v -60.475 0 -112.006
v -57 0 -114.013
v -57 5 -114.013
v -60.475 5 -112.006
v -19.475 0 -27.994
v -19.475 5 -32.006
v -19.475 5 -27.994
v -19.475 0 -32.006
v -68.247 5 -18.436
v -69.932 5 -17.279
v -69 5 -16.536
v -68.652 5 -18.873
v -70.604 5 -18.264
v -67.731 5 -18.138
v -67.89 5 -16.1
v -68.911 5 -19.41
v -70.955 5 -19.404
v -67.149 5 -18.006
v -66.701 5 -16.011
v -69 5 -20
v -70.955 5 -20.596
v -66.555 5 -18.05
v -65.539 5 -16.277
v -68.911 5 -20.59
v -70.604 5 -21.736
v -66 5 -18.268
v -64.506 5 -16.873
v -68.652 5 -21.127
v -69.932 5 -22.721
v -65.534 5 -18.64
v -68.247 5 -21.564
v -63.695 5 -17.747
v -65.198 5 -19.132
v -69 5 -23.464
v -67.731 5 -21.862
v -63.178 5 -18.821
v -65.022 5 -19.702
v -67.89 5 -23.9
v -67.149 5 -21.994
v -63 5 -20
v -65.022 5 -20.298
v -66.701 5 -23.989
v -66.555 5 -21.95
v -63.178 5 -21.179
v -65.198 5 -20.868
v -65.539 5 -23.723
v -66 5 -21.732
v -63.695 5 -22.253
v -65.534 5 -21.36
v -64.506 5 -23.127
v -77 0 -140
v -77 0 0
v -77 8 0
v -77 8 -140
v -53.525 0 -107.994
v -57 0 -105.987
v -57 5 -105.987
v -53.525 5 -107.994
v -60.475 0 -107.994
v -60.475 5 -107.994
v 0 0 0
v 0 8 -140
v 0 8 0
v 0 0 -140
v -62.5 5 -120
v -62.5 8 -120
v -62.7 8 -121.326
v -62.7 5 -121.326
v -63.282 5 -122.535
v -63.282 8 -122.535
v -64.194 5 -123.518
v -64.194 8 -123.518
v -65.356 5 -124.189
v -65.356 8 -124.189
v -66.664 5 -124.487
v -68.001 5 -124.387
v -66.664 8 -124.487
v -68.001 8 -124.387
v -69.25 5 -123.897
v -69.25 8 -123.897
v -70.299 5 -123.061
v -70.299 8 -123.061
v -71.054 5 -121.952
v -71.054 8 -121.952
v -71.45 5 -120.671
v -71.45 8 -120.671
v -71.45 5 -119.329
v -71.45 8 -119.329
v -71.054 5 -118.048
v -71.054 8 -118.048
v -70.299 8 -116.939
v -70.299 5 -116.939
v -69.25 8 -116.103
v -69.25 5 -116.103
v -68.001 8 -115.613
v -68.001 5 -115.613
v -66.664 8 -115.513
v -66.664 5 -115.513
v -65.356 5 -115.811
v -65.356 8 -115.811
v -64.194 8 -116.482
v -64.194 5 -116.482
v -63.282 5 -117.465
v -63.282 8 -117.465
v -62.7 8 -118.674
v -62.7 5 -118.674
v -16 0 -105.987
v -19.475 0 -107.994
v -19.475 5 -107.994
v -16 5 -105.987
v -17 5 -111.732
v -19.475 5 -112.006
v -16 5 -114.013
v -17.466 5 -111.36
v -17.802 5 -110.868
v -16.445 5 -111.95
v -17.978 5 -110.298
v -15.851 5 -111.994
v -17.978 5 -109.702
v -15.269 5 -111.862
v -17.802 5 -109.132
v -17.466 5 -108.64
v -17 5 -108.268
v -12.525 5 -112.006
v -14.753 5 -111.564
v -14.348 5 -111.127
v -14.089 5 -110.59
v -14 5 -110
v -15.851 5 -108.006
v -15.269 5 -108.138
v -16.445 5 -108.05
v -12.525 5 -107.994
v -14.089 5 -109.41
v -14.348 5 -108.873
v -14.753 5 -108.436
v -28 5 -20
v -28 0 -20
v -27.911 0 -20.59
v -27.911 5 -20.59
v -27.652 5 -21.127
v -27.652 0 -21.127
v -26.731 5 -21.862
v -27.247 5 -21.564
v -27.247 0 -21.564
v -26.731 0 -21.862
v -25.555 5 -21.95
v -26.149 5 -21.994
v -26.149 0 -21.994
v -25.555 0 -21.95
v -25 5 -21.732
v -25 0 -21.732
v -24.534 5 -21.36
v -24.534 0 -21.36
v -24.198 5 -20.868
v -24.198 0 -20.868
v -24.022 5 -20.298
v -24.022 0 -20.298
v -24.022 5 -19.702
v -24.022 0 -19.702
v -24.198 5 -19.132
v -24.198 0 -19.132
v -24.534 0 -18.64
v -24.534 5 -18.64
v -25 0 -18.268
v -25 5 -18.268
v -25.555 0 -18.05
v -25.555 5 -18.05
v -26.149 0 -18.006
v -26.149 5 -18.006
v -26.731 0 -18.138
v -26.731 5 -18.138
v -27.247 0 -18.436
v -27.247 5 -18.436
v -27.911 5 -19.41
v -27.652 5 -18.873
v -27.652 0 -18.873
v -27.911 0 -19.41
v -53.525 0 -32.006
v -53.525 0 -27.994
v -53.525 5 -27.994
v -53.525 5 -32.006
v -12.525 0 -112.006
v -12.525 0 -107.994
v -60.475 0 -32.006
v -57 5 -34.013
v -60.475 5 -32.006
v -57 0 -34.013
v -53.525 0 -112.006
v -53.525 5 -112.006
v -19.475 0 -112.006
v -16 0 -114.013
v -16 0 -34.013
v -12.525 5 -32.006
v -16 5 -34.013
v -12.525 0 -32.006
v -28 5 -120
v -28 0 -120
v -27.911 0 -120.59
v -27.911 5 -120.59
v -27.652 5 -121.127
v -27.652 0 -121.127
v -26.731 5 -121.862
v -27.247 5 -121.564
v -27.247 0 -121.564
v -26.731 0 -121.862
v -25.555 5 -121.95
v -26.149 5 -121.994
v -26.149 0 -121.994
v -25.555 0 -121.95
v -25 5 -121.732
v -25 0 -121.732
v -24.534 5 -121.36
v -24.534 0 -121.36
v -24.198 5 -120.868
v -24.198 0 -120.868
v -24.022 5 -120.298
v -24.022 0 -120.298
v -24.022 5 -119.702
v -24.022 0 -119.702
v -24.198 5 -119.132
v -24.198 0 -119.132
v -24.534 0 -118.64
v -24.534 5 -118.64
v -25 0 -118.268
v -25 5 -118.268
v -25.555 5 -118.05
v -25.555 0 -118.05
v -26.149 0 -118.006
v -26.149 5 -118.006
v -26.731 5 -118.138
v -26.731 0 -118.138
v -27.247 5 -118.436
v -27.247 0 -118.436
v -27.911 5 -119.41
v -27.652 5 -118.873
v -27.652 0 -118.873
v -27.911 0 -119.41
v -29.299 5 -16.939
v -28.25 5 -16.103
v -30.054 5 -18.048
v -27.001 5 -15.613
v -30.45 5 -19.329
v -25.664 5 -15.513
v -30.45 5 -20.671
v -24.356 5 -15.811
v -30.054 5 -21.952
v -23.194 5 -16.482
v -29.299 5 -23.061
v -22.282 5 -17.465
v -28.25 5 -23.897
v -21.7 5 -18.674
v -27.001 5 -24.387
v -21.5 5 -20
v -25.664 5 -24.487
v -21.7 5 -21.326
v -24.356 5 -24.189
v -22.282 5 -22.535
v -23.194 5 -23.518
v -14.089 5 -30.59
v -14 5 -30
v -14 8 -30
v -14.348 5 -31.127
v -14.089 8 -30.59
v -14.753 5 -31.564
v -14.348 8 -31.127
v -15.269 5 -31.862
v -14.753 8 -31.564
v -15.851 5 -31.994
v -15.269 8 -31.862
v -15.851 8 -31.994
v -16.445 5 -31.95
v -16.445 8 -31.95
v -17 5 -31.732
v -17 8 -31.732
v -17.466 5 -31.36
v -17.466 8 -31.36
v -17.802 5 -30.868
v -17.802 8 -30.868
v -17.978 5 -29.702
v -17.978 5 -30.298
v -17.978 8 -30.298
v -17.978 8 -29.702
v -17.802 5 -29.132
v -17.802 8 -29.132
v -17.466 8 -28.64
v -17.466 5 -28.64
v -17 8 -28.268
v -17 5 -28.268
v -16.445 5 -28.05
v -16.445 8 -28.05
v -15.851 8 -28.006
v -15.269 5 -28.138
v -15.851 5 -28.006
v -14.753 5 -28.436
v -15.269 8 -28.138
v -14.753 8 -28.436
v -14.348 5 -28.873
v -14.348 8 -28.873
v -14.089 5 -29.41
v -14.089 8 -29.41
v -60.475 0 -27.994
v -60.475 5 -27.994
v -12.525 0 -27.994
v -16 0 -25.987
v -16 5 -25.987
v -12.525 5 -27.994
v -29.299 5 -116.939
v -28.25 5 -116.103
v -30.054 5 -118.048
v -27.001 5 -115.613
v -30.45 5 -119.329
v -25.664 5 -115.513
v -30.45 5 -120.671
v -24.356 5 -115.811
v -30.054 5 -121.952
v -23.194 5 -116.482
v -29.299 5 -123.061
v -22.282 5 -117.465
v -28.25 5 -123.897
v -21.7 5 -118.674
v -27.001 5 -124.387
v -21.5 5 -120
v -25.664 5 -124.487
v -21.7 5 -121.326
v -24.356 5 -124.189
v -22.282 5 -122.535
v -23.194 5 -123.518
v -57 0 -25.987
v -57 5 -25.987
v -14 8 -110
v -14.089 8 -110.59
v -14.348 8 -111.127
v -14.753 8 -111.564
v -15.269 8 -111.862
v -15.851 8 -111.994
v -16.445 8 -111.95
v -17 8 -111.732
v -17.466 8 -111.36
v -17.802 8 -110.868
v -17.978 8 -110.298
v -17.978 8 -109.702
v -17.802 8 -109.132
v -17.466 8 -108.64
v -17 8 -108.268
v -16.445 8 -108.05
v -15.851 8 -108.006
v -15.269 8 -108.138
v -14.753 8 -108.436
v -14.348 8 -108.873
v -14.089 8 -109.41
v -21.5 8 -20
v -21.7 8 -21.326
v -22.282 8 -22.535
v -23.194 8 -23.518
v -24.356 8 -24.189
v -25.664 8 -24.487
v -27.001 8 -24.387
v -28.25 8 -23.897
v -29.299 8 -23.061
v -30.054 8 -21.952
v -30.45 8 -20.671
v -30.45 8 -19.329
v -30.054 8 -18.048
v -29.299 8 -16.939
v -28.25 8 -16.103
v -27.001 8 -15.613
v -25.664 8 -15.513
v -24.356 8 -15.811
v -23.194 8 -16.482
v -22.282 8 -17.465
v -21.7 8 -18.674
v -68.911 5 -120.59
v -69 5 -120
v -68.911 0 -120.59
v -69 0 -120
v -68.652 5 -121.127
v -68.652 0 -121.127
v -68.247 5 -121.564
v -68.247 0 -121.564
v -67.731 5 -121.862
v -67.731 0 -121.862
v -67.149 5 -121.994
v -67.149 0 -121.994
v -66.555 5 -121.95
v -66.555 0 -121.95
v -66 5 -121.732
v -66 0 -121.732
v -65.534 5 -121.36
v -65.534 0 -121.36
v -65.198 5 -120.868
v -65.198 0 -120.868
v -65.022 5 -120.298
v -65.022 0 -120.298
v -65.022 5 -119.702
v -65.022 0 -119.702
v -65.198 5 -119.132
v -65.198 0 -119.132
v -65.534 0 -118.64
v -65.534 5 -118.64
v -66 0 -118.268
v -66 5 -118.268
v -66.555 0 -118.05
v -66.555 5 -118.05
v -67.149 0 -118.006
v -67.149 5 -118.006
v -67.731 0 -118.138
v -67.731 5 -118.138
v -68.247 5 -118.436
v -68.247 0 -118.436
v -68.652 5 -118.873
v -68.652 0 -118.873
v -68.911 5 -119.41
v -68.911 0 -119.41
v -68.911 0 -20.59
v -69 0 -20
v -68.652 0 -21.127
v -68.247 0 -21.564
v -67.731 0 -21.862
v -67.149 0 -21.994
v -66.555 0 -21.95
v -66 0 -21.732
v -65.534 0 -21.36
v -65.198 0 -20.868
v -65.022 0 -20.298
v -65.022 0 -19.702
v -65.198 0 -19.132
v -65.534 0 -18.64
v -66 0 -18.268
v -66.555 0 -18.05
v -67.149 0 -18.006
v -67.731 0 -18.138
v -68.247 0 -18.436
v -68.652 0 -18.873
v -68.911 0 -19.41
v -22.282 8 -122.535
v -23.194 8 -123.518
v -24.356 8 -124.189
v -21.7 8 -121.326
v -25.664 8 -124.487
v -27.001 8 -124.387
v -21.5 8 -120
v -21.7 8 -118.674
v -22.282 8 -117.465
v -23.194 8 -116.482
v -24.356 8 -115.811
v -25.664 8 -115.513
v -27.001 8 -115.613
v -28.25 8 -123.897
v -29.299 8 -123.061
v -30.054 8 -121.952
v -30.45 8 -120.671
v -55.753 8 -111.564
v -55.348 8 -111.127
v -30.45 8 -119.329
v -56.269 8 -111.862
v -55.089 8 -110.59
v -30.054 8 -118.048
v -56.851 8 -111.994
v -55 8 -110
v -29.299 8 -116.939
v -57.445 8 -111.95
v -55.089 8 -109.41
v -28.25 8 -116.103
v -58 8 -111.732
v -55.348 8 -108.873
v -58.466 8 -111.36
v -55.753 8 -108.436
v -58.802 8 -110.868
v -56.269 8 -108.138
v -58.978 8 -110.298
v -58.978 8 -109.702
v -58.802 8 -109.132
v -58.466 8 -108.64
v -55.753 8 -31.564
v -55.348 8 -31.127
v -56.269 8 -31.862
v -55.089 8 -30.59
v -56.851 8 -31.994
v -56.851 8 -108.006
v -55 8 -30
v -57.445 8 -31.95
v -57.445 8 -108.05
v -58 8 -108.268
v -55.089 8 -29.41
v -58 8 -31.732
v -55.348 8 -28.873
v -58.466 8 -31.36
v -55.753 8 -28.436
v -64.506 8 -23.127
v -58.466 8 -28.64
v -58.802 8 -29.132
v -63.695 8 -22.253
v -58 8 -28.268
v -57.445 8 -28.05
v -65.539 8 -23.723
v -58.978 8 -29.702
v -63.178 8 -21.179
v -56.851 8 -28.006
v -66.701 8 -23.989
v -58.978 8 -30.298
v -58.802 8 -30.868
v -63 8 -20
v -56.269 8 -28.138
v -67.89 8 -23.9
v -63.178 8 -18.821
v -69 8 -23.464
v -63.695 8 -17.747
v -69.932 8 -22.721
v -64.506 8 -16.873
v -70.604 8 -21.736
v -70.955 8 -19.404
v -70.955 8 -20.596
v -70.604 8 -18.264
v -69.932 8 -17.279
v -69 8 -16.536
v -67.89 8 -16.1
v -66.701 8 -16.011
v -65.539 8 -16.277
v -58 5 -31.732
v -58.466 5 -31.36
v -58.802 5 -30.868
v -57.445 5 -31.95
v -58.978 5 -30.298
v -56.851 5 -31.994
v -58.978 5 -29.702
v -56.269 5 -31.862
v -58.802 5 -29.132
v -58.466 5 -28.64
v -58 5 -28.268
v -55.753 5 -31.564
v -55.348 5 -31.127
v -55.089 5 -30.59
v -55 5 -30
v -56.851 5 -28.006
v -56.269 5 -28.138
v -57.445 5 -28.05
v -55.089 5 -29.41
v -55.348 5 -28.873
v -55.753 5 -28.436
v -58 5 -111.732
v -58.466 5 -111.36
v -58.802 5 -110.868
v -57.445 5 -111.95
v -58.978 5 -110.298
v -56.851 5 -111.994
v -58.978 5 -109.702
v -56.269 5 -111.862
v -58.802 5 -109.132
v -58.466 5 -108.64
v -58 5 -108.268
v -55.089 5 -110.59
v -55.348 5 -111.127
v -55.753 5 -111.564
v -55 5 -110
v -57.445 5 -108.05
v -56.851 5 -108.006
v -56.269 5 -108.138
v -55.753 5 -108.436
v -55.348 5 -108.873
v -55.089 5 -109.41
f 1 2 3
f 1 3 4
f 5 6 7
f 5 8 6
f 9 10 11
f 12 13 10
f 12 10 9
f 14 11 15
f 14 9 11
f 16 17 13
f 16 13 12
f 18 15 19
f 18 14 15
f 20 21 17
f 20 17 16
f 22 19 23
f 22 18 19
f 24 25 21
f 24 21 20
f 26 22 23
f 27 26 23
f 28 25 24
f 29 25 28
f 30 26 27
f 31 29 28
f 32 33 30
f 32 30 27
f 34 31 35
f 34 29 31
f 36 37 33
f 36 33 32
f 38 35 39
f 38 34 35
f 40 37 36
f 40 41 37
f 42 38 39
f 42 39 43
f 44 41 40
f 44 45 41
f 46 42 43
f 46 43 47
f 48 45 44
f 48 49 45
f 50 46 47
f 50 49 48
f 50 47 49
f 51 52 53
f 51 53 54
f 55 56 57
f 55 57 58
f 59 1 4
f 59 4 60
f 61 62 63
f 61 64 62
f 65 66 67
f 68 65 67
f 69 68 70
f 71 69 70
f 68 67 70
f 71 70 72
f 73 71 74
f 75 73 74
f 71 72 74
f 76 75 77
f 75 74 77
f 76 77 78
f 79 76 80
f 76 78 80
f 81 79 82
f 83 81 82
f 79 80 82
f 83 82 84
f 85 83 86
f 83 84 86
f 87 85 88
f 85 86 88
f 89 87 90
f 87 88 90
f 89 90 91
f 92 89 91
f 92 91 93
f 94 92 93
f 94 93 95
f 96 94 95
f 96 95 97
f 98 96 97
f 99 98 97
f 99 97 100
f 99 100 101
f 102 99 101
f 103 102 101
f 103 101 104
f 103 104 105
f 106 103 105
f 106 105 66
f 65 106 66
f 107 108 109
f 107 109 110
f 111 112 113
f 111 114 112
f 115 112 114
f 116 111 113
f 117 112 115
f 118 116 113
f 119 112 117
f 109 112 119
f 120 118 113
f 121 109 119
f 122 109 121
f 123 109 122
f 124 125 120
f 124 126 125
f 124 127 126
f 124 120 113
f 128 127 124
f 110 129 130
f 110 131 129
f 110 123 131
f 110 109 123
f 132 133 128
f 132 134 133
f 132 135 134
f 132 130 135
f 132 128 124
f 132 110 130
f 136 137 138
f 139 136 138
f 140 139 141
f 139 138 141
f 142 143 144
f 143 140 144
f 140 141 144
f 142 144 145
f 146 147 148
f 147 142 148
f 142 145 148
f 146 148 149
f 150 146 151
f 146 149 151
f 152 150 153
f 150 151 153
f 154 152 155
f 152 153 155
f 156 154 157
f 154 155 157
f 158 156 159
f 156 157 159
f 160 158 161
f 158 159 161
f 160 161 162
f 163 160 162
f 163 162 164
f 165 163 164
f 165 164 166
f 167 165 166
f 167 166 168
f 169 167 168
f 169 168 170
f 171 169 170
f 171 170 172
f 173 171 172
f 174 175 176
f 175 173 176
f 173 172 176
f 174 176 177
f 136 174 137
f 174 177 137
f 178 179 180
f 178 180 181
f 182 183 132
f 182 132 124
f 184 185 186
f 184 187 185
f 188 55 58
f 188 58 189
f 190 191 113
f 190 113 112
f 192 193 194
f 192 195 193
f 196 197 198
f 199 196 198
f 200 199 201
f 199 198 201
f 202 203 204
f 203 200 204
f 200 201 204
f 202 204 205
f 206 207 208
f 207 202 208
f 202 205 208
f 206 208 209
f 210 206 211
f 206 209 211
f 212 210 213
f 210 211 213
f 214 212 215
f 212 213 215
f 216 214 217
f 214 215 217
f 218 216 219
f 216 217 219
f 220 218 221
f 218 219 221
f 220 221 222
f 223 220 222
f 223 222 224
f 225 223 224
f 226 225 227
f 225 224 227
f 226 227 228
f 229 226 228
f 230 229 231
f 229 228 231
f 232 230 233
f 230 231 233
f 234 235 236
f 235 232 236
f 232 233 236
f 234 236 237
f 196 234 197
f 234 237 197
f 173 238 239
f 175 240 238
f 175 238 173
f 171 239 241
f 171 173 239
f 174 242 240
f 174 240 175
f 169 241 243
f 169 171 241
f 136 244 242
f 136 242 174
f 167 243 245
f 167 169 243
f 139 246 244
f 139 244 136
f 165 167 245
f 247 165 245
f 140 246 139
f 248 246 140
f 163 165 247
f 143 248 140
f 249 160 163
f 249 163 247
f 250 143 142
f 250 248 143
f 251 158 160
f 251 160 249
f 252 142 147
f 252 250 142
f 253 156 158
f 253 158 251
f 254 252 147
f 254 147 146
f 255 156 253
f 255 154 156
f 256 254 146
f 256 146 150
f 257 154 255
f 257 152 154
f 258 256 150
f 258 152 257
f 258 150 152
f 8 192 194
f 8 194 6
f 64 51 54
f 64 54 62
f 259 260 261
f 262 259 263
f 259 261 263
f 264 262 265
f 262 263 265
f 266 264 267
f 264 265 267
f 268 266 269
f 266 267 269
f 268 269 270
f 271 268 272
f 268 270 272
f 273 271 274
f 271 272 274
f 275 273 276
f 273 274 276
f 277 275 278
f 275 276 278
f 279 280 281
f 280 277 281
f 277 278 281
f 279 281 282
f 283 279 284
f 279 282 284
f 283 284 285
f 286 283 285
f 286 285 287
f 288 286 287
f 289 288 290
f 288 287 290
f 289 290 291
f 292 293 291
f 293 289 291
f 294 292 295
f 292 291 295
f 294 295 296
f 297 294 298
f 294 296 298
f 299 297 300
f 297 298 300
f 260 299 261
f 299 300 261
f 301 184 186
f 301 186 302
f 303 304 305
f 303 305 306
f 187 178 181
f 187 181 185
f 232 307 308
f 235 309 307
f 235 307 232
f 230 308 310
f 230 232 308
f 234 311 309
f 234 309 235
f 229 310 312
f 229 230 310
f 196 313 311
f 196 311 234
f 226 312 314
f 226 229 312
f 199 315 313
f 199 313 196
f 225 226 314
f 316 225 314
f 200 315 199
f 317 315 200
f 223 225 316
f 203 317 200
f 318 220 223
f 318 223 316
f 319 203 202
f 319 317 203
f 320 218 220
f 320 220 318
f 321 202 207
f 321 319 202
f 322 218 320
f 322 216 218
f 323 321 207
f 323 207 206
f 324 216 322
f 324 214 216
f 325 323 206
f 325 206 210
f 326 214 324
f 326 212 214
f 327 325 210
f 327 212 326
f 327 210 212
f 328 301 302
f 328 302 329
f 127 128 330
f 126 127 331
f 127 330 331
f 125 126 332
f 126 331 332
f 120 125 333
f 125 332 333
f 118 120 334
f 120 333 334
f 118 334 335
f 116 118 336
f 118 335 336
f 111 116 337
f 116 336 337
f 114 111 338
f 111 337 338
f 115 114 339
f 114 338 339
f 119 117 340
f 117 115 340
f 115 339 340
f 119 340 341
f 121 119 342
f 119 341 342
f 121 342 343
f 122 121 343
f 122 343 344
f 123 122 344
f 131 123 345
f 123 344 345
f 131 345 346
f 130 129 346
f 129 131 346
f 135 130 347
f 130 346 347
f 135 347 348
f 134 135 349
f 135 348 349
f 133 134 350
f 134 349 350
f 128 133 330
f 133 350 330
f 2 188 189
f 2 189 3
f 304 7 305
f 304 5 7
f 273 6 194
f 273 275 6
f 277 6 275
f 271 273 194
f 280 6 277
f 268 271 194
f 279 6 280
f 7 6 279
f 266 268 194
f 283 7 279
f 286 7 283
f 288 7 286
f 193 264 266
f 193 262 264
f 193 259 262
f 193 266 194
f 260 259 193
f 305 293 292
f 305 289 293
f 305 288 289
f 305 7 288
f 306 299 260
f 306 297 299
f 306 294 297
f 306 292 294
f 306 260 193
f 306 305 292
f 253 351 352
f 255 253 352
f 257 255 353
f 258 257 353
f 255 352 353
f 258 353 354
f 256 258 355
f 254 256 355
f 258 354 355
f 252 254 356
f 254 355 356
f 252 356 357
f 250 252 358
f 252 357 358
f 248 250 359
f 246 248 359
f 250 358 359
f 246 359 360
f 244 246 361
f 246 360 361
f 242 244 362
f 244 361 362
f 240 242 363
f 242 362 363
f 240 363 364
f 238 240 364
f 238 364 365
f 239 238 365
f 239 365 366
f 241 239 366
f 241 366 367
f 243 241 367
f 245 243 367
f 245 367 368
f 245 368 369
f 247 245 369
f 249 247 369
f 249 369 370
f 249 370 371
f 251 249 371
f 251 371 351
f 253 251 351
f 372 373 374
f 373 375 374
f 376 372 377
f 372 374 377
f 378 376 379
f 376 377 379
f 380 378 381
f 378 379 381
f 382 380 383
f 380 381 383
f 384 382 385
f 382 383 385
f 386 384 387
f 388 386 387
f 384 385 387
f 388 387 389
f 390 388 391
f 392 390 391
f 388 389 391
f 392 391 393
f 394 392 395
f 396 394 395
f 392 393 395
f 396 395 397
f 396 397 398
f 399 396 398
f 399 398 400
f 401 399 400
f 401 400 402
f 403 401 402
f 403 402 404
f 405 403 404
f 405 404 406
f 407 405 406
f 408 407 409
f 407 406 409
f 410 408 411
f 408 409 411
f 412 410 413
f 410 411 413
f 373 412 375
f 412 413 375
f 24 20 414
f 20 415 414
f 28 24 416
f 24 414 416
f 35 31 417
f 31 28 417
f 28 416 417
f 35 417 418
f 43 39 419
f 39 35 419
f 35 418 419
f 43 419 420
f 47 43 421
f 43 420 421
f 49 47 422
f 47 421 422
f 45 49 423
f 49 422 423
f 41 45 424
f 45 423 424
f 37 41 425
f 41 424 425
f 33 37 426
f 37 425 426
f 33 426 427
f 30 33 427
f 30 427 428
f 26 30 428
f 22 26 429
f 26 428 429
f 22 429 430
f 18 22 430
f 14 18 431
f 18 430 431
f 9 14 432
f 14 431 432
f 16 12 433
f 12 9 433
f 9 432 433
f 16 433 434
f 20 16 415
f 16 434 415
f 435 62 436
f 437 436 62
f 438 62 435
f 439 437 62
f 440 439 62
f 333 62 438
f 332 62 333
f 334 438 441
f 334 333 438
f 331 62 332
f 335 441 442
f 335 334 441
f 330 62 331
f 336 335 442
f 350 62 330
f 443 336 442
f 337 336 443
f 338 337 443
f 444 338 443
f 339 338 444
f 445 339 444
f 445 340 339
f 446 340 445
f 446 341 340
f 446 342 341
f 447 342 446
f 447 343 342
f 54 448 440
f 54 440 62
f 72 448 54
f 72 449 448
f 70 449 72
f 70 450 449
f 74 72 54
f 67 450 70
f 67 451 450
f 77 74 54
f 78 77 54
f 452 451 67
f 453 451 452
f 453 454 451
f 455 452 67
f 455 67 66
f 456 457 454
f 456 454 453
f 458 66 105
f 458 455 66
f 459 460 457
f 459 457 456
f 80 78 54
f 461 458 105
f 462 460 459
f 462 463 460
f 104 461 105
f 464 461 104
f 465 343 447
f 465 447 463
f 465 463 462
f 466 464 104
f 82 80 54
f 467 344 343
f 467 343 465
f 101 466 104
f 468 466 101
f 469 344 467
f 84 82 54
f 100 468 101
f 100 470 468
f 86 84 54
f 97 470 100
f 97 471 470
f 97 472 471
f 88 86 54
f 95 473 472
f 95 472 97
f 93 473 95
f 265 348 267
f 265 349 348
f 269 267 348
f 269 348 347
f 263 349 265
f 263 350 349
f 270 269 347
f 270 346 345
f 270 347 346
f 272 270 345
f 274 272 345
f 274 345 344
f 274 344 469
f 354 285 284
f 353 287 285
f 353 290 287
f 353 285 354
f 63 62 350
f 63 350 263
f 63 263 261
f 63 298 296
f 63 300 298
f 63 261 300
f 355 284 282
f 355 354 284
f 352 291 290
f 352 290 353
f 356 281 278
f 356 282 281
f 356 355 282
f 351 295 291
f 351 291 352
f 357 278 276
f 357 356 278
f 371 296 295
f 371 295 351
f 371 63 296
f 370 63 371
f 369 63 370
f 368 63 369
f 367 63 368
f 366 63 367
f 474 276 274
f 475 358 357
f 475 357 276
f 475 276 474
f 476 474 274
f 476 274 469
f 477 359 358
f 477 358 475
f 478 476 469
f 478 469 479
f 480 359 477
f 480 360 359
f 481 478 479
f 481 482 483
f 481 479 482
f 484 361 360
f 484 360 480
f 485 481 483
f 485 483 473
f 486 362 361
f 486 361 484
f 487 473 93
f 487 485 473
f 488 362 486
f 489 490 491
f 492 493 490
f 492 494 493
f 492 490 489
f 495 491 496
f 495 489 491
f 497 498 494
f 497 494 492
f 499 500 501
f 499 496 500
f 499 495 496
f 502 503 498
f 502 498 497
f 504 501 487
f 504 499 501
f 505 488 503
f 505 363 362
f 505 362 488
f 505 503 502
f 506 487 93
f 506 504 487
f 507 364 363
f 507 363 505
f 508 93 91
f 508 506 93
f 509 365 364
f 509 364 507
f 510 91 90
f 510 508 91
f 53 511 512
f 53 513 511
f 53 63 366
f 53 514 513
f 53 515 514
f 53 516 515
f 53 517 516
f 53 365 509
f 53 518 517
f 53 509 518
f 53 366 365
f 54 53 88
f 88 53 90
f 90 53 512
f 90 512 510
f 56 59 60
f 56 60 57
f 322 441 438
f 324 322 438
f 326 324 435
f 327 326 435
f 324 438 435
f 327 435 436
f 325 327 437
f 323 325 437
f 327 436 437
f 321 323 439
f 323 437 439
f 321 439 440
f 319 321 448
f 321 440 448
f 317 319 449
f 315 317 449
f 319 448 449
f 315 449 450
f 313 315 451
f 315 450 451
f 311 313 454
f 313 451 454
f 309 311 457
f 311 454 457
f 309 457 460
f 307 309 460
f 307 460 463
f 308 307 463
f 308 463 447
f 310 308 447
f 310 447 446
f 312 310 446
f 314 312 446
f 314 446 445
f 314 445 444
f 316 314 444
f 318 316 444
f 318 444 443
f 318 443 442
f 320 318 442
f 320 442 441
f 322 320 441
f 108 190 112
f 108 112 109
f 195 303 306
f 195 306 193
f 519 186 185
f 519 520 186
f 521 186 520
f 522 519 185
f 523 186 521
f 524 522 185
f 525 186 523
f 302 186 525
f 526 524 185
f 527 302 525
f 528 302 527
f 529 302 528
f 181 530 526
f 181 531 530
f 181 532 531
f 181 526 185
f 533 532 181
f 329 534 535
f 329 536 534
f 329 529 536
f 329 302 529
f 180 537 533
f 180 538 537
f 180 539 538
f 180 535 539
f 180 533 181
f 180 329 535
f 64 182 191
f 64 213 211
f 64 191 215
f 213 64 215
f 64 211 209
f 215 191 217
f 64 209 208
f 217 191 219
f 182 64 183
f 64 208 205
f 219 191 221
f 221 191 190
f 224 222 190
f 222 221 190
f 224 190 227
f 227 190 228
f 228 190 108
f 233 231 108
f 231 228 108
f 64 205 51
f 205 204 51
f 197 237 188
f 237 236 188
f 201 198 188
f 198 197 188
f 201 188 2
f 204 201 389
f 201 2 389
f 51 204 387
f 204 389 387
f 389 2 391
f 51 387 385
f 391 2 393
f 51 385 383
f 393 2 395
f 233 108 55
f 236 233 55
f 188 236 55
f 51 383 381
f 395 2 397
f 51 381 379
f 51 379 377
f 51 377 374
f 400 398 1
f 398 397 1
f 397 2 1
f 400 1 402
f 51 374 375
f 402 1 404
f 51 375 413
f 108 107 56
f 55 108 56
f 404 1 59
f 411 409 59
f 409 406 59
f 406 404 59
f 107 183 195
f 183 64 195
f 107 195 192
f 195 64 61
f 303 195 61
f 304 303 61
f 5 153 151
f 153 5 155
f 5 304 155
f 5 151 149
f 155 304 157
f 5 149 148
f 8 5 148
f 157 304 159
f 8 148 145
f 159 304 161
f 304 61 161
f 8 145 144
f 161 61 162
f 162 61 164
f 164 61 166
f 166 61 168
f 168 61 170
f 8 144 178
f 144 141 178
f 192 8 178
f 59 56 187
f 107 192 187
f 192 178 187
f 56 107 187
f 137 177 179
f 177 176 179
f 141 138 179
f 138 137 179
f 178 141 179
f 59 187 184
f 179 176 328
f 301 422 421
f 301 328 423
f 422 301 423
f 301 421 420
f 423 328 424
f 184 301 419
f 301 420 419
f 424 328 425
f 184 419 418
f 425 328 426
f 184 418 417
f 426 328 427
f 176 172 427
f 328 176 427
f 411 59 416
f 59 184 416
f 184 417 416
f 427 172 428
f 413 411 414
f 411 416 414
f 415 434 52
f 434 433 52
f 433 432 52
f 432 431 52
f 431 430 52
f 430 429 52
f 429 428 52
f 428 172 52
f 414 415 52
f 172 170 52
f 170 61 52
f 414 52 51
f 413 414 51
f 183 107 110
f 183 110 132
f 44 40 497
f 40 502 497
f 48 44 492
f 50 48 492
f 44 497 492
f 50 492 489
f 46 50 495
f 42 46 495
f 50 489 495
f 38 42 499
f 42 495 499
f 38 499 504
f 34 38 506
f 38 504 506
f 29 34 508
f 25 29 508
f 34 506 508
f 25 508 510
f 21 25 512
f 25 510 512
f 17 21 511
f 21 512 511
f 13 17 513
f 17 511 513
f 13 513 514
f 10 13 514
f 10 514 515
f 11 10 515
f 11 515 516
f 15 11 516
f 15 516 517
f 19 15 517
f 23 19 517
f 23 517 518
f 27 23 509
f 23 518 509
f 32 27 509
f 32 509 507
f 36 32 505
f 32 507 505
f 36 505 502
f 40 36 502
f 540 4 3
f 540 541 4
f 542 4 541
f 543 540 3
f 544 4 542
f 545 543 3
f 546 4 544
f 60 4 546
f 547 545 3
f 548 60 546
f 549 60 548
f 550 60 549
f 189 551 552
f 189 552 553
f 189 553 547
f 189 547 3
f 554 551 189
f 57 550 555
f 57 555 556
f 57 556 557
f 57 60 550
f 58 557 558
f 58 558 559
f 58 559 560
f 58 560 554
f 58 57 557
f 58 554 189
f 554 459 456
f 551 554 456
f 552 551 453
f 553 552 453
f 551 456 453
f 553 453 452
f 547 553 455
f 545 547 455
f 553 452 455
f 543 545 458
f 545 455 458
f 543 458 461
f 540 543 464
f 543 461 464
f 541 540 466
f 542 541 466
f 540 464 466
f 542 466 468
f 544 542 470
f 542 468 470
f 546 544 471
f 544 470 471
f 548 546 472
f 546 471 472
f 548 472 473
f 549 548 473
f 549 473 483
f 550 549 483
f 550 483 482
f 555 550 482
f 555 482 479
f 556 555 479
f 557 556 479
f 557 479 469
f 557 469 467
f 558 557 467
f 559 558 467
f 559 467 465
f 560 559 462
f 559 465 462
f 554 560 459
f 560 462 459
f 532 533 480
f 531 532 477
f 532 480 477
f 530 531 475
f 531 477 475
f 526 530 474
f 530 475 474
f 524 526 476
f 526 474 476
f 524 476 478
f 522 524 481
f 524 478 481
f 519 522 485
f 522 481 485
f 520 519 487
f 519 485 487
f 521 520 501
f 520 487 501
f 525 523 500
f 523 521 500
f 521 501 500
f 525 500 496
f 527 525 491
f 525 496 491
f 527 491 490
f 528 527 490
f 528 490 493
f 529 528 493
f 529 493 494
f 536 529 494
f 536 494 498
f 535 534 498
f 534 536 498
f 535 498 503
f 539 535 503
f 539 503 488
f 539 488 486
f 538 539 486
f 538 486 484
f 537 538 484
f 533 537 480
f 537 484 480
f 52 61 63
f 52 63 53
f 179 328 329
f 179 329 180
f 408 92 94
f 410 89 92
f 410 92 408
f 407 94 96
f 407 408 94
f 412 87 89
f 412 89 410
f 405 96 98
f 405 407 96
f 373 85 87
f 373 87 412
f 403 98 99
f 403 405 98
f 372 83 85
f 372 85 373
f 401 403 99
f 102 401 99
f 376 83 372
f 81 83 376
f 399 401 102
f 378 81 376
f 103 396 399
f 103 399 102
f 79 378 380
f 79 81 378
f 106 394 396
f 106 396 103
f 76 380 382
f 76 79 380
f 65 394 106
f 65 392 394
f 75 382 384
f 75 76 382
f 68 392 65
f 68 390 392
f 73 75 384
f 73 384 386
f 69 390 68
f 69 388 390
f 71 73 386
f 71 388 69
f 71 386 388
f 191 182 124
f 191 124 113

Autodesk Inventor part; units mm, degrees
ref_plane "YZ Plane" through (0, 0, 0) normal (1, 0, 0) x (0, 1, 0)
ref_plane "XZ Plane" through (0, 0, 0) normal (0, 1, 0) x (-1, 0, 0)
ref_plane "XY Plane" through (0, 0, 0) normal (0, 0, 1) x (1, 0, 0)
sketch "Esboço1" plane through (0, 0, 0) normal (0, 1, 0) x (-1, 0, 0)
  line L0 (0, 0) -> (77, 0)
  line L1 (77, 0) -> (77, -140)
  line L2 (77, -140) -> (0, -140)
  line L3 (0, -140) -> (0, 0)
  circle A0 centre (67, -20) radius 2
  circle A1 centre (67, -120) radius 2
  circle A2 centre (26, -20) radius 2
  circle A3 centre (26, -120) radius 2
  dimension "d0" = 77
  dimension "d1" = 140
  dimension "d2" = 4
  dimension "d3" = 4
  dimension "d4" = 4
  dimension "d5" = 4
  dimension "d6" = 10
  dimension "d7" = 10
  dimension "d8" = 20
  dimension "d9" = 20
  dimension "d10" = 20
  dimension "d11" = 20
  dimension "d12" = 26
  dimension "d13" = 26
extrude "Extrusão1" add sketch "Esboço1" along normal blind 8
sketch "Esboço2" plane through (0, 8, 0) normal (0, 1, 0) x (1, 0, 0)
  circle A0 centre (-67, 20) radius 2 projected
  circle A1 centre (-26, 20) radius 2 projected
  circle A2 centre (-26, 120) radius 2 projected
  circle A3 centre (-67, 120) radius 2 projected
  circle A4 centre (-67, 20) radius 4
  circle A5 centre (-67, 120) radius 2 projected
  circle A6 centre (-67, 120) radius 4.5
  circle A7 centre (-26, 120) radius 2 projected
  circle A8 centre (-26, 120) radius 4.5
  circle A9 centre (-26, 20) radius 2 projected
  circle A10 centre (-26, 20) radius 4.5
  point P0 (0, 0)
  dimension "d16" = 8
  dimension "d17" = 9
  dimension "d18" = 9
  dimension "d19" = 9
extrude "Extrusão2" cut sketch "Esboço2" against normal blind 3 contours A3 | A4 | A6 | A8 | A10
sketch "Esboço3" plane through (0, 8, 0) normal (0, 1, 0) x (1, 0, 0)
  point P0 (0, 0)
sketch "Esboço4" plane through (0, 8, 0) normal (0, 1, 0) x (1, 0, 0)
  circle A0 centre (-57, 30) radius 2
  circle A1 centre (-57, 110) radius 2
  circle A2 centre (-67, 20) radius 2 projected
  circle A3 centre (-67, 120) radius 2 projected
  circle A4 centre (-16, 30) radius 2
  circle A5 centre (-16, 110) radius 2
  circle A6 centre (-26, 20) radius 2 projected
  circle A7 centre (-26, 120) radius 2 projected
  point P0 (0, 0)
  dimension "d22" = 4
  dimension "d23" = 4
  dimension "d24" = 10
  dimension "d25" = 10
  dimension "d26" = 10
  dimension "d27" = 10
  dimension "d28" = 4
  dimension "d29" = 4
  dimension "d30" = 10
  dimension "d31" = 10
  dimension "d32" = 10
  dimension "d33" = 10
extrude "Extrusão3" cut sketch "Esboço4" against normal blind 12 contours A0 | A1 | A4 | A5
sketch "Esboço5" plane through (0, 0, 0) normal (0, -1, 0) x (1, 0, 0)
  circle A0 centre (-57, -110) radius 2 projected
  circle A1 centre (-16, -110) radius 2 projected
  circle A2 centre (-16, -30) radius 2 projected
  circle A3 centre (-57, -30) radius 2 projected
  line L0 (-53.525, -112.0063) -> (-57, -114.0126)
  line L1 (-57, -114.0126) -> (-60.475, -112.0063)
  line L2 (-60.475, -112.0063) -> (-60.475, -107.9937)
  line L3 (-60.475, -107.9937) -> (-57, -105.9874)
  line L4 (-57, -105.9874) -> (-53.525, -107.9937)
  line L5 (-53.525, -107.9937) -> (-53.525, -112.0063)
  line L6 (-53.525, -32.0063) -> (-57, -34.0126)
  line L7 (-57, -34.0126) -> (-60.475, -32.0063)
  line L8 (-60.475, -32.0063) -> (-60.475, -27.9937)
  line L9 (-60.475, -27.9937) -> (-57, -25.9874)
  line L10 (-57, -25.9874) -> (-53.525, -27.9937)
  line L11 (-53.525, -27.9937) -> (-53.525, -32.0063)
  line L12 (-16, -105.9874) -> (-12.525, -107.9937)
  line L13 (-12.525, -107.9937) -> (-12.525, -112.0063)
  line L14 (-12.525, -112.0063) -> (-16, -114.0126)
  line L15 (-16, -114.0126) -> (-19.475, -112.0063)
  line L16 (-19.475, -112.0063) -> (-19.475, -107.9937)
  line L17 (-19.475, -107.9937) -> (-16, -105.9874)
  circle A4 centre (-16, -30) radius 2 projected
  line L18 (-12.525, -32.0063) -> (-16, -34.0126)
  line L19 (-16, -34.0126) -> (-19.475, -32.0063)
  line L20 (-19.475, -32.0063) -> (-19.475, -27.9937)
  line L21 (-19.475, -27.9937) -> (-16, -25.9874)
  line L22 (-16, -25.9874) -> (-12.525, -27.9937)
  line L23 (-12.525, -27.9937) -> (-12.525, -32.0063)
  line L24 (-77, -140) -> (-77, 0) projected
  line L25 (0, 0) -> (0, -140) projected
  dimension "d36" = 6.95
  dimension "d37" = 6.95
  dimension "d38" = 6.95
  dimension "d39" = 6.95
extrude "Extrusão4" cut sketch "Esboço5" against normal blind 5 contours A0 | L0 L1 L2 L3 L4 L5 | L6 L7 L8 L9 L10 L11 | L12 L13 L14 L15 L16 L17 | L18 L19 L20 L21 L22 L23
equation "\"d4\" = d3"
equation "\"d5\" = d3"
equation "\"d7\" = d6"
equation "\"d9\" = d8"
equation "\"d10\" = d9"
equation "\"d11\" = d8"
equation "\"d26\" = d25"
equation "\"d27\" = d26"
equation "\"d30\" = d24"
equation "\"d33\" = d32"
equation "\"d36\" = d39"
equation "\"d37\" = d39"
equation "\"d38\" = d39"
properties part number "suporte-fonte"
